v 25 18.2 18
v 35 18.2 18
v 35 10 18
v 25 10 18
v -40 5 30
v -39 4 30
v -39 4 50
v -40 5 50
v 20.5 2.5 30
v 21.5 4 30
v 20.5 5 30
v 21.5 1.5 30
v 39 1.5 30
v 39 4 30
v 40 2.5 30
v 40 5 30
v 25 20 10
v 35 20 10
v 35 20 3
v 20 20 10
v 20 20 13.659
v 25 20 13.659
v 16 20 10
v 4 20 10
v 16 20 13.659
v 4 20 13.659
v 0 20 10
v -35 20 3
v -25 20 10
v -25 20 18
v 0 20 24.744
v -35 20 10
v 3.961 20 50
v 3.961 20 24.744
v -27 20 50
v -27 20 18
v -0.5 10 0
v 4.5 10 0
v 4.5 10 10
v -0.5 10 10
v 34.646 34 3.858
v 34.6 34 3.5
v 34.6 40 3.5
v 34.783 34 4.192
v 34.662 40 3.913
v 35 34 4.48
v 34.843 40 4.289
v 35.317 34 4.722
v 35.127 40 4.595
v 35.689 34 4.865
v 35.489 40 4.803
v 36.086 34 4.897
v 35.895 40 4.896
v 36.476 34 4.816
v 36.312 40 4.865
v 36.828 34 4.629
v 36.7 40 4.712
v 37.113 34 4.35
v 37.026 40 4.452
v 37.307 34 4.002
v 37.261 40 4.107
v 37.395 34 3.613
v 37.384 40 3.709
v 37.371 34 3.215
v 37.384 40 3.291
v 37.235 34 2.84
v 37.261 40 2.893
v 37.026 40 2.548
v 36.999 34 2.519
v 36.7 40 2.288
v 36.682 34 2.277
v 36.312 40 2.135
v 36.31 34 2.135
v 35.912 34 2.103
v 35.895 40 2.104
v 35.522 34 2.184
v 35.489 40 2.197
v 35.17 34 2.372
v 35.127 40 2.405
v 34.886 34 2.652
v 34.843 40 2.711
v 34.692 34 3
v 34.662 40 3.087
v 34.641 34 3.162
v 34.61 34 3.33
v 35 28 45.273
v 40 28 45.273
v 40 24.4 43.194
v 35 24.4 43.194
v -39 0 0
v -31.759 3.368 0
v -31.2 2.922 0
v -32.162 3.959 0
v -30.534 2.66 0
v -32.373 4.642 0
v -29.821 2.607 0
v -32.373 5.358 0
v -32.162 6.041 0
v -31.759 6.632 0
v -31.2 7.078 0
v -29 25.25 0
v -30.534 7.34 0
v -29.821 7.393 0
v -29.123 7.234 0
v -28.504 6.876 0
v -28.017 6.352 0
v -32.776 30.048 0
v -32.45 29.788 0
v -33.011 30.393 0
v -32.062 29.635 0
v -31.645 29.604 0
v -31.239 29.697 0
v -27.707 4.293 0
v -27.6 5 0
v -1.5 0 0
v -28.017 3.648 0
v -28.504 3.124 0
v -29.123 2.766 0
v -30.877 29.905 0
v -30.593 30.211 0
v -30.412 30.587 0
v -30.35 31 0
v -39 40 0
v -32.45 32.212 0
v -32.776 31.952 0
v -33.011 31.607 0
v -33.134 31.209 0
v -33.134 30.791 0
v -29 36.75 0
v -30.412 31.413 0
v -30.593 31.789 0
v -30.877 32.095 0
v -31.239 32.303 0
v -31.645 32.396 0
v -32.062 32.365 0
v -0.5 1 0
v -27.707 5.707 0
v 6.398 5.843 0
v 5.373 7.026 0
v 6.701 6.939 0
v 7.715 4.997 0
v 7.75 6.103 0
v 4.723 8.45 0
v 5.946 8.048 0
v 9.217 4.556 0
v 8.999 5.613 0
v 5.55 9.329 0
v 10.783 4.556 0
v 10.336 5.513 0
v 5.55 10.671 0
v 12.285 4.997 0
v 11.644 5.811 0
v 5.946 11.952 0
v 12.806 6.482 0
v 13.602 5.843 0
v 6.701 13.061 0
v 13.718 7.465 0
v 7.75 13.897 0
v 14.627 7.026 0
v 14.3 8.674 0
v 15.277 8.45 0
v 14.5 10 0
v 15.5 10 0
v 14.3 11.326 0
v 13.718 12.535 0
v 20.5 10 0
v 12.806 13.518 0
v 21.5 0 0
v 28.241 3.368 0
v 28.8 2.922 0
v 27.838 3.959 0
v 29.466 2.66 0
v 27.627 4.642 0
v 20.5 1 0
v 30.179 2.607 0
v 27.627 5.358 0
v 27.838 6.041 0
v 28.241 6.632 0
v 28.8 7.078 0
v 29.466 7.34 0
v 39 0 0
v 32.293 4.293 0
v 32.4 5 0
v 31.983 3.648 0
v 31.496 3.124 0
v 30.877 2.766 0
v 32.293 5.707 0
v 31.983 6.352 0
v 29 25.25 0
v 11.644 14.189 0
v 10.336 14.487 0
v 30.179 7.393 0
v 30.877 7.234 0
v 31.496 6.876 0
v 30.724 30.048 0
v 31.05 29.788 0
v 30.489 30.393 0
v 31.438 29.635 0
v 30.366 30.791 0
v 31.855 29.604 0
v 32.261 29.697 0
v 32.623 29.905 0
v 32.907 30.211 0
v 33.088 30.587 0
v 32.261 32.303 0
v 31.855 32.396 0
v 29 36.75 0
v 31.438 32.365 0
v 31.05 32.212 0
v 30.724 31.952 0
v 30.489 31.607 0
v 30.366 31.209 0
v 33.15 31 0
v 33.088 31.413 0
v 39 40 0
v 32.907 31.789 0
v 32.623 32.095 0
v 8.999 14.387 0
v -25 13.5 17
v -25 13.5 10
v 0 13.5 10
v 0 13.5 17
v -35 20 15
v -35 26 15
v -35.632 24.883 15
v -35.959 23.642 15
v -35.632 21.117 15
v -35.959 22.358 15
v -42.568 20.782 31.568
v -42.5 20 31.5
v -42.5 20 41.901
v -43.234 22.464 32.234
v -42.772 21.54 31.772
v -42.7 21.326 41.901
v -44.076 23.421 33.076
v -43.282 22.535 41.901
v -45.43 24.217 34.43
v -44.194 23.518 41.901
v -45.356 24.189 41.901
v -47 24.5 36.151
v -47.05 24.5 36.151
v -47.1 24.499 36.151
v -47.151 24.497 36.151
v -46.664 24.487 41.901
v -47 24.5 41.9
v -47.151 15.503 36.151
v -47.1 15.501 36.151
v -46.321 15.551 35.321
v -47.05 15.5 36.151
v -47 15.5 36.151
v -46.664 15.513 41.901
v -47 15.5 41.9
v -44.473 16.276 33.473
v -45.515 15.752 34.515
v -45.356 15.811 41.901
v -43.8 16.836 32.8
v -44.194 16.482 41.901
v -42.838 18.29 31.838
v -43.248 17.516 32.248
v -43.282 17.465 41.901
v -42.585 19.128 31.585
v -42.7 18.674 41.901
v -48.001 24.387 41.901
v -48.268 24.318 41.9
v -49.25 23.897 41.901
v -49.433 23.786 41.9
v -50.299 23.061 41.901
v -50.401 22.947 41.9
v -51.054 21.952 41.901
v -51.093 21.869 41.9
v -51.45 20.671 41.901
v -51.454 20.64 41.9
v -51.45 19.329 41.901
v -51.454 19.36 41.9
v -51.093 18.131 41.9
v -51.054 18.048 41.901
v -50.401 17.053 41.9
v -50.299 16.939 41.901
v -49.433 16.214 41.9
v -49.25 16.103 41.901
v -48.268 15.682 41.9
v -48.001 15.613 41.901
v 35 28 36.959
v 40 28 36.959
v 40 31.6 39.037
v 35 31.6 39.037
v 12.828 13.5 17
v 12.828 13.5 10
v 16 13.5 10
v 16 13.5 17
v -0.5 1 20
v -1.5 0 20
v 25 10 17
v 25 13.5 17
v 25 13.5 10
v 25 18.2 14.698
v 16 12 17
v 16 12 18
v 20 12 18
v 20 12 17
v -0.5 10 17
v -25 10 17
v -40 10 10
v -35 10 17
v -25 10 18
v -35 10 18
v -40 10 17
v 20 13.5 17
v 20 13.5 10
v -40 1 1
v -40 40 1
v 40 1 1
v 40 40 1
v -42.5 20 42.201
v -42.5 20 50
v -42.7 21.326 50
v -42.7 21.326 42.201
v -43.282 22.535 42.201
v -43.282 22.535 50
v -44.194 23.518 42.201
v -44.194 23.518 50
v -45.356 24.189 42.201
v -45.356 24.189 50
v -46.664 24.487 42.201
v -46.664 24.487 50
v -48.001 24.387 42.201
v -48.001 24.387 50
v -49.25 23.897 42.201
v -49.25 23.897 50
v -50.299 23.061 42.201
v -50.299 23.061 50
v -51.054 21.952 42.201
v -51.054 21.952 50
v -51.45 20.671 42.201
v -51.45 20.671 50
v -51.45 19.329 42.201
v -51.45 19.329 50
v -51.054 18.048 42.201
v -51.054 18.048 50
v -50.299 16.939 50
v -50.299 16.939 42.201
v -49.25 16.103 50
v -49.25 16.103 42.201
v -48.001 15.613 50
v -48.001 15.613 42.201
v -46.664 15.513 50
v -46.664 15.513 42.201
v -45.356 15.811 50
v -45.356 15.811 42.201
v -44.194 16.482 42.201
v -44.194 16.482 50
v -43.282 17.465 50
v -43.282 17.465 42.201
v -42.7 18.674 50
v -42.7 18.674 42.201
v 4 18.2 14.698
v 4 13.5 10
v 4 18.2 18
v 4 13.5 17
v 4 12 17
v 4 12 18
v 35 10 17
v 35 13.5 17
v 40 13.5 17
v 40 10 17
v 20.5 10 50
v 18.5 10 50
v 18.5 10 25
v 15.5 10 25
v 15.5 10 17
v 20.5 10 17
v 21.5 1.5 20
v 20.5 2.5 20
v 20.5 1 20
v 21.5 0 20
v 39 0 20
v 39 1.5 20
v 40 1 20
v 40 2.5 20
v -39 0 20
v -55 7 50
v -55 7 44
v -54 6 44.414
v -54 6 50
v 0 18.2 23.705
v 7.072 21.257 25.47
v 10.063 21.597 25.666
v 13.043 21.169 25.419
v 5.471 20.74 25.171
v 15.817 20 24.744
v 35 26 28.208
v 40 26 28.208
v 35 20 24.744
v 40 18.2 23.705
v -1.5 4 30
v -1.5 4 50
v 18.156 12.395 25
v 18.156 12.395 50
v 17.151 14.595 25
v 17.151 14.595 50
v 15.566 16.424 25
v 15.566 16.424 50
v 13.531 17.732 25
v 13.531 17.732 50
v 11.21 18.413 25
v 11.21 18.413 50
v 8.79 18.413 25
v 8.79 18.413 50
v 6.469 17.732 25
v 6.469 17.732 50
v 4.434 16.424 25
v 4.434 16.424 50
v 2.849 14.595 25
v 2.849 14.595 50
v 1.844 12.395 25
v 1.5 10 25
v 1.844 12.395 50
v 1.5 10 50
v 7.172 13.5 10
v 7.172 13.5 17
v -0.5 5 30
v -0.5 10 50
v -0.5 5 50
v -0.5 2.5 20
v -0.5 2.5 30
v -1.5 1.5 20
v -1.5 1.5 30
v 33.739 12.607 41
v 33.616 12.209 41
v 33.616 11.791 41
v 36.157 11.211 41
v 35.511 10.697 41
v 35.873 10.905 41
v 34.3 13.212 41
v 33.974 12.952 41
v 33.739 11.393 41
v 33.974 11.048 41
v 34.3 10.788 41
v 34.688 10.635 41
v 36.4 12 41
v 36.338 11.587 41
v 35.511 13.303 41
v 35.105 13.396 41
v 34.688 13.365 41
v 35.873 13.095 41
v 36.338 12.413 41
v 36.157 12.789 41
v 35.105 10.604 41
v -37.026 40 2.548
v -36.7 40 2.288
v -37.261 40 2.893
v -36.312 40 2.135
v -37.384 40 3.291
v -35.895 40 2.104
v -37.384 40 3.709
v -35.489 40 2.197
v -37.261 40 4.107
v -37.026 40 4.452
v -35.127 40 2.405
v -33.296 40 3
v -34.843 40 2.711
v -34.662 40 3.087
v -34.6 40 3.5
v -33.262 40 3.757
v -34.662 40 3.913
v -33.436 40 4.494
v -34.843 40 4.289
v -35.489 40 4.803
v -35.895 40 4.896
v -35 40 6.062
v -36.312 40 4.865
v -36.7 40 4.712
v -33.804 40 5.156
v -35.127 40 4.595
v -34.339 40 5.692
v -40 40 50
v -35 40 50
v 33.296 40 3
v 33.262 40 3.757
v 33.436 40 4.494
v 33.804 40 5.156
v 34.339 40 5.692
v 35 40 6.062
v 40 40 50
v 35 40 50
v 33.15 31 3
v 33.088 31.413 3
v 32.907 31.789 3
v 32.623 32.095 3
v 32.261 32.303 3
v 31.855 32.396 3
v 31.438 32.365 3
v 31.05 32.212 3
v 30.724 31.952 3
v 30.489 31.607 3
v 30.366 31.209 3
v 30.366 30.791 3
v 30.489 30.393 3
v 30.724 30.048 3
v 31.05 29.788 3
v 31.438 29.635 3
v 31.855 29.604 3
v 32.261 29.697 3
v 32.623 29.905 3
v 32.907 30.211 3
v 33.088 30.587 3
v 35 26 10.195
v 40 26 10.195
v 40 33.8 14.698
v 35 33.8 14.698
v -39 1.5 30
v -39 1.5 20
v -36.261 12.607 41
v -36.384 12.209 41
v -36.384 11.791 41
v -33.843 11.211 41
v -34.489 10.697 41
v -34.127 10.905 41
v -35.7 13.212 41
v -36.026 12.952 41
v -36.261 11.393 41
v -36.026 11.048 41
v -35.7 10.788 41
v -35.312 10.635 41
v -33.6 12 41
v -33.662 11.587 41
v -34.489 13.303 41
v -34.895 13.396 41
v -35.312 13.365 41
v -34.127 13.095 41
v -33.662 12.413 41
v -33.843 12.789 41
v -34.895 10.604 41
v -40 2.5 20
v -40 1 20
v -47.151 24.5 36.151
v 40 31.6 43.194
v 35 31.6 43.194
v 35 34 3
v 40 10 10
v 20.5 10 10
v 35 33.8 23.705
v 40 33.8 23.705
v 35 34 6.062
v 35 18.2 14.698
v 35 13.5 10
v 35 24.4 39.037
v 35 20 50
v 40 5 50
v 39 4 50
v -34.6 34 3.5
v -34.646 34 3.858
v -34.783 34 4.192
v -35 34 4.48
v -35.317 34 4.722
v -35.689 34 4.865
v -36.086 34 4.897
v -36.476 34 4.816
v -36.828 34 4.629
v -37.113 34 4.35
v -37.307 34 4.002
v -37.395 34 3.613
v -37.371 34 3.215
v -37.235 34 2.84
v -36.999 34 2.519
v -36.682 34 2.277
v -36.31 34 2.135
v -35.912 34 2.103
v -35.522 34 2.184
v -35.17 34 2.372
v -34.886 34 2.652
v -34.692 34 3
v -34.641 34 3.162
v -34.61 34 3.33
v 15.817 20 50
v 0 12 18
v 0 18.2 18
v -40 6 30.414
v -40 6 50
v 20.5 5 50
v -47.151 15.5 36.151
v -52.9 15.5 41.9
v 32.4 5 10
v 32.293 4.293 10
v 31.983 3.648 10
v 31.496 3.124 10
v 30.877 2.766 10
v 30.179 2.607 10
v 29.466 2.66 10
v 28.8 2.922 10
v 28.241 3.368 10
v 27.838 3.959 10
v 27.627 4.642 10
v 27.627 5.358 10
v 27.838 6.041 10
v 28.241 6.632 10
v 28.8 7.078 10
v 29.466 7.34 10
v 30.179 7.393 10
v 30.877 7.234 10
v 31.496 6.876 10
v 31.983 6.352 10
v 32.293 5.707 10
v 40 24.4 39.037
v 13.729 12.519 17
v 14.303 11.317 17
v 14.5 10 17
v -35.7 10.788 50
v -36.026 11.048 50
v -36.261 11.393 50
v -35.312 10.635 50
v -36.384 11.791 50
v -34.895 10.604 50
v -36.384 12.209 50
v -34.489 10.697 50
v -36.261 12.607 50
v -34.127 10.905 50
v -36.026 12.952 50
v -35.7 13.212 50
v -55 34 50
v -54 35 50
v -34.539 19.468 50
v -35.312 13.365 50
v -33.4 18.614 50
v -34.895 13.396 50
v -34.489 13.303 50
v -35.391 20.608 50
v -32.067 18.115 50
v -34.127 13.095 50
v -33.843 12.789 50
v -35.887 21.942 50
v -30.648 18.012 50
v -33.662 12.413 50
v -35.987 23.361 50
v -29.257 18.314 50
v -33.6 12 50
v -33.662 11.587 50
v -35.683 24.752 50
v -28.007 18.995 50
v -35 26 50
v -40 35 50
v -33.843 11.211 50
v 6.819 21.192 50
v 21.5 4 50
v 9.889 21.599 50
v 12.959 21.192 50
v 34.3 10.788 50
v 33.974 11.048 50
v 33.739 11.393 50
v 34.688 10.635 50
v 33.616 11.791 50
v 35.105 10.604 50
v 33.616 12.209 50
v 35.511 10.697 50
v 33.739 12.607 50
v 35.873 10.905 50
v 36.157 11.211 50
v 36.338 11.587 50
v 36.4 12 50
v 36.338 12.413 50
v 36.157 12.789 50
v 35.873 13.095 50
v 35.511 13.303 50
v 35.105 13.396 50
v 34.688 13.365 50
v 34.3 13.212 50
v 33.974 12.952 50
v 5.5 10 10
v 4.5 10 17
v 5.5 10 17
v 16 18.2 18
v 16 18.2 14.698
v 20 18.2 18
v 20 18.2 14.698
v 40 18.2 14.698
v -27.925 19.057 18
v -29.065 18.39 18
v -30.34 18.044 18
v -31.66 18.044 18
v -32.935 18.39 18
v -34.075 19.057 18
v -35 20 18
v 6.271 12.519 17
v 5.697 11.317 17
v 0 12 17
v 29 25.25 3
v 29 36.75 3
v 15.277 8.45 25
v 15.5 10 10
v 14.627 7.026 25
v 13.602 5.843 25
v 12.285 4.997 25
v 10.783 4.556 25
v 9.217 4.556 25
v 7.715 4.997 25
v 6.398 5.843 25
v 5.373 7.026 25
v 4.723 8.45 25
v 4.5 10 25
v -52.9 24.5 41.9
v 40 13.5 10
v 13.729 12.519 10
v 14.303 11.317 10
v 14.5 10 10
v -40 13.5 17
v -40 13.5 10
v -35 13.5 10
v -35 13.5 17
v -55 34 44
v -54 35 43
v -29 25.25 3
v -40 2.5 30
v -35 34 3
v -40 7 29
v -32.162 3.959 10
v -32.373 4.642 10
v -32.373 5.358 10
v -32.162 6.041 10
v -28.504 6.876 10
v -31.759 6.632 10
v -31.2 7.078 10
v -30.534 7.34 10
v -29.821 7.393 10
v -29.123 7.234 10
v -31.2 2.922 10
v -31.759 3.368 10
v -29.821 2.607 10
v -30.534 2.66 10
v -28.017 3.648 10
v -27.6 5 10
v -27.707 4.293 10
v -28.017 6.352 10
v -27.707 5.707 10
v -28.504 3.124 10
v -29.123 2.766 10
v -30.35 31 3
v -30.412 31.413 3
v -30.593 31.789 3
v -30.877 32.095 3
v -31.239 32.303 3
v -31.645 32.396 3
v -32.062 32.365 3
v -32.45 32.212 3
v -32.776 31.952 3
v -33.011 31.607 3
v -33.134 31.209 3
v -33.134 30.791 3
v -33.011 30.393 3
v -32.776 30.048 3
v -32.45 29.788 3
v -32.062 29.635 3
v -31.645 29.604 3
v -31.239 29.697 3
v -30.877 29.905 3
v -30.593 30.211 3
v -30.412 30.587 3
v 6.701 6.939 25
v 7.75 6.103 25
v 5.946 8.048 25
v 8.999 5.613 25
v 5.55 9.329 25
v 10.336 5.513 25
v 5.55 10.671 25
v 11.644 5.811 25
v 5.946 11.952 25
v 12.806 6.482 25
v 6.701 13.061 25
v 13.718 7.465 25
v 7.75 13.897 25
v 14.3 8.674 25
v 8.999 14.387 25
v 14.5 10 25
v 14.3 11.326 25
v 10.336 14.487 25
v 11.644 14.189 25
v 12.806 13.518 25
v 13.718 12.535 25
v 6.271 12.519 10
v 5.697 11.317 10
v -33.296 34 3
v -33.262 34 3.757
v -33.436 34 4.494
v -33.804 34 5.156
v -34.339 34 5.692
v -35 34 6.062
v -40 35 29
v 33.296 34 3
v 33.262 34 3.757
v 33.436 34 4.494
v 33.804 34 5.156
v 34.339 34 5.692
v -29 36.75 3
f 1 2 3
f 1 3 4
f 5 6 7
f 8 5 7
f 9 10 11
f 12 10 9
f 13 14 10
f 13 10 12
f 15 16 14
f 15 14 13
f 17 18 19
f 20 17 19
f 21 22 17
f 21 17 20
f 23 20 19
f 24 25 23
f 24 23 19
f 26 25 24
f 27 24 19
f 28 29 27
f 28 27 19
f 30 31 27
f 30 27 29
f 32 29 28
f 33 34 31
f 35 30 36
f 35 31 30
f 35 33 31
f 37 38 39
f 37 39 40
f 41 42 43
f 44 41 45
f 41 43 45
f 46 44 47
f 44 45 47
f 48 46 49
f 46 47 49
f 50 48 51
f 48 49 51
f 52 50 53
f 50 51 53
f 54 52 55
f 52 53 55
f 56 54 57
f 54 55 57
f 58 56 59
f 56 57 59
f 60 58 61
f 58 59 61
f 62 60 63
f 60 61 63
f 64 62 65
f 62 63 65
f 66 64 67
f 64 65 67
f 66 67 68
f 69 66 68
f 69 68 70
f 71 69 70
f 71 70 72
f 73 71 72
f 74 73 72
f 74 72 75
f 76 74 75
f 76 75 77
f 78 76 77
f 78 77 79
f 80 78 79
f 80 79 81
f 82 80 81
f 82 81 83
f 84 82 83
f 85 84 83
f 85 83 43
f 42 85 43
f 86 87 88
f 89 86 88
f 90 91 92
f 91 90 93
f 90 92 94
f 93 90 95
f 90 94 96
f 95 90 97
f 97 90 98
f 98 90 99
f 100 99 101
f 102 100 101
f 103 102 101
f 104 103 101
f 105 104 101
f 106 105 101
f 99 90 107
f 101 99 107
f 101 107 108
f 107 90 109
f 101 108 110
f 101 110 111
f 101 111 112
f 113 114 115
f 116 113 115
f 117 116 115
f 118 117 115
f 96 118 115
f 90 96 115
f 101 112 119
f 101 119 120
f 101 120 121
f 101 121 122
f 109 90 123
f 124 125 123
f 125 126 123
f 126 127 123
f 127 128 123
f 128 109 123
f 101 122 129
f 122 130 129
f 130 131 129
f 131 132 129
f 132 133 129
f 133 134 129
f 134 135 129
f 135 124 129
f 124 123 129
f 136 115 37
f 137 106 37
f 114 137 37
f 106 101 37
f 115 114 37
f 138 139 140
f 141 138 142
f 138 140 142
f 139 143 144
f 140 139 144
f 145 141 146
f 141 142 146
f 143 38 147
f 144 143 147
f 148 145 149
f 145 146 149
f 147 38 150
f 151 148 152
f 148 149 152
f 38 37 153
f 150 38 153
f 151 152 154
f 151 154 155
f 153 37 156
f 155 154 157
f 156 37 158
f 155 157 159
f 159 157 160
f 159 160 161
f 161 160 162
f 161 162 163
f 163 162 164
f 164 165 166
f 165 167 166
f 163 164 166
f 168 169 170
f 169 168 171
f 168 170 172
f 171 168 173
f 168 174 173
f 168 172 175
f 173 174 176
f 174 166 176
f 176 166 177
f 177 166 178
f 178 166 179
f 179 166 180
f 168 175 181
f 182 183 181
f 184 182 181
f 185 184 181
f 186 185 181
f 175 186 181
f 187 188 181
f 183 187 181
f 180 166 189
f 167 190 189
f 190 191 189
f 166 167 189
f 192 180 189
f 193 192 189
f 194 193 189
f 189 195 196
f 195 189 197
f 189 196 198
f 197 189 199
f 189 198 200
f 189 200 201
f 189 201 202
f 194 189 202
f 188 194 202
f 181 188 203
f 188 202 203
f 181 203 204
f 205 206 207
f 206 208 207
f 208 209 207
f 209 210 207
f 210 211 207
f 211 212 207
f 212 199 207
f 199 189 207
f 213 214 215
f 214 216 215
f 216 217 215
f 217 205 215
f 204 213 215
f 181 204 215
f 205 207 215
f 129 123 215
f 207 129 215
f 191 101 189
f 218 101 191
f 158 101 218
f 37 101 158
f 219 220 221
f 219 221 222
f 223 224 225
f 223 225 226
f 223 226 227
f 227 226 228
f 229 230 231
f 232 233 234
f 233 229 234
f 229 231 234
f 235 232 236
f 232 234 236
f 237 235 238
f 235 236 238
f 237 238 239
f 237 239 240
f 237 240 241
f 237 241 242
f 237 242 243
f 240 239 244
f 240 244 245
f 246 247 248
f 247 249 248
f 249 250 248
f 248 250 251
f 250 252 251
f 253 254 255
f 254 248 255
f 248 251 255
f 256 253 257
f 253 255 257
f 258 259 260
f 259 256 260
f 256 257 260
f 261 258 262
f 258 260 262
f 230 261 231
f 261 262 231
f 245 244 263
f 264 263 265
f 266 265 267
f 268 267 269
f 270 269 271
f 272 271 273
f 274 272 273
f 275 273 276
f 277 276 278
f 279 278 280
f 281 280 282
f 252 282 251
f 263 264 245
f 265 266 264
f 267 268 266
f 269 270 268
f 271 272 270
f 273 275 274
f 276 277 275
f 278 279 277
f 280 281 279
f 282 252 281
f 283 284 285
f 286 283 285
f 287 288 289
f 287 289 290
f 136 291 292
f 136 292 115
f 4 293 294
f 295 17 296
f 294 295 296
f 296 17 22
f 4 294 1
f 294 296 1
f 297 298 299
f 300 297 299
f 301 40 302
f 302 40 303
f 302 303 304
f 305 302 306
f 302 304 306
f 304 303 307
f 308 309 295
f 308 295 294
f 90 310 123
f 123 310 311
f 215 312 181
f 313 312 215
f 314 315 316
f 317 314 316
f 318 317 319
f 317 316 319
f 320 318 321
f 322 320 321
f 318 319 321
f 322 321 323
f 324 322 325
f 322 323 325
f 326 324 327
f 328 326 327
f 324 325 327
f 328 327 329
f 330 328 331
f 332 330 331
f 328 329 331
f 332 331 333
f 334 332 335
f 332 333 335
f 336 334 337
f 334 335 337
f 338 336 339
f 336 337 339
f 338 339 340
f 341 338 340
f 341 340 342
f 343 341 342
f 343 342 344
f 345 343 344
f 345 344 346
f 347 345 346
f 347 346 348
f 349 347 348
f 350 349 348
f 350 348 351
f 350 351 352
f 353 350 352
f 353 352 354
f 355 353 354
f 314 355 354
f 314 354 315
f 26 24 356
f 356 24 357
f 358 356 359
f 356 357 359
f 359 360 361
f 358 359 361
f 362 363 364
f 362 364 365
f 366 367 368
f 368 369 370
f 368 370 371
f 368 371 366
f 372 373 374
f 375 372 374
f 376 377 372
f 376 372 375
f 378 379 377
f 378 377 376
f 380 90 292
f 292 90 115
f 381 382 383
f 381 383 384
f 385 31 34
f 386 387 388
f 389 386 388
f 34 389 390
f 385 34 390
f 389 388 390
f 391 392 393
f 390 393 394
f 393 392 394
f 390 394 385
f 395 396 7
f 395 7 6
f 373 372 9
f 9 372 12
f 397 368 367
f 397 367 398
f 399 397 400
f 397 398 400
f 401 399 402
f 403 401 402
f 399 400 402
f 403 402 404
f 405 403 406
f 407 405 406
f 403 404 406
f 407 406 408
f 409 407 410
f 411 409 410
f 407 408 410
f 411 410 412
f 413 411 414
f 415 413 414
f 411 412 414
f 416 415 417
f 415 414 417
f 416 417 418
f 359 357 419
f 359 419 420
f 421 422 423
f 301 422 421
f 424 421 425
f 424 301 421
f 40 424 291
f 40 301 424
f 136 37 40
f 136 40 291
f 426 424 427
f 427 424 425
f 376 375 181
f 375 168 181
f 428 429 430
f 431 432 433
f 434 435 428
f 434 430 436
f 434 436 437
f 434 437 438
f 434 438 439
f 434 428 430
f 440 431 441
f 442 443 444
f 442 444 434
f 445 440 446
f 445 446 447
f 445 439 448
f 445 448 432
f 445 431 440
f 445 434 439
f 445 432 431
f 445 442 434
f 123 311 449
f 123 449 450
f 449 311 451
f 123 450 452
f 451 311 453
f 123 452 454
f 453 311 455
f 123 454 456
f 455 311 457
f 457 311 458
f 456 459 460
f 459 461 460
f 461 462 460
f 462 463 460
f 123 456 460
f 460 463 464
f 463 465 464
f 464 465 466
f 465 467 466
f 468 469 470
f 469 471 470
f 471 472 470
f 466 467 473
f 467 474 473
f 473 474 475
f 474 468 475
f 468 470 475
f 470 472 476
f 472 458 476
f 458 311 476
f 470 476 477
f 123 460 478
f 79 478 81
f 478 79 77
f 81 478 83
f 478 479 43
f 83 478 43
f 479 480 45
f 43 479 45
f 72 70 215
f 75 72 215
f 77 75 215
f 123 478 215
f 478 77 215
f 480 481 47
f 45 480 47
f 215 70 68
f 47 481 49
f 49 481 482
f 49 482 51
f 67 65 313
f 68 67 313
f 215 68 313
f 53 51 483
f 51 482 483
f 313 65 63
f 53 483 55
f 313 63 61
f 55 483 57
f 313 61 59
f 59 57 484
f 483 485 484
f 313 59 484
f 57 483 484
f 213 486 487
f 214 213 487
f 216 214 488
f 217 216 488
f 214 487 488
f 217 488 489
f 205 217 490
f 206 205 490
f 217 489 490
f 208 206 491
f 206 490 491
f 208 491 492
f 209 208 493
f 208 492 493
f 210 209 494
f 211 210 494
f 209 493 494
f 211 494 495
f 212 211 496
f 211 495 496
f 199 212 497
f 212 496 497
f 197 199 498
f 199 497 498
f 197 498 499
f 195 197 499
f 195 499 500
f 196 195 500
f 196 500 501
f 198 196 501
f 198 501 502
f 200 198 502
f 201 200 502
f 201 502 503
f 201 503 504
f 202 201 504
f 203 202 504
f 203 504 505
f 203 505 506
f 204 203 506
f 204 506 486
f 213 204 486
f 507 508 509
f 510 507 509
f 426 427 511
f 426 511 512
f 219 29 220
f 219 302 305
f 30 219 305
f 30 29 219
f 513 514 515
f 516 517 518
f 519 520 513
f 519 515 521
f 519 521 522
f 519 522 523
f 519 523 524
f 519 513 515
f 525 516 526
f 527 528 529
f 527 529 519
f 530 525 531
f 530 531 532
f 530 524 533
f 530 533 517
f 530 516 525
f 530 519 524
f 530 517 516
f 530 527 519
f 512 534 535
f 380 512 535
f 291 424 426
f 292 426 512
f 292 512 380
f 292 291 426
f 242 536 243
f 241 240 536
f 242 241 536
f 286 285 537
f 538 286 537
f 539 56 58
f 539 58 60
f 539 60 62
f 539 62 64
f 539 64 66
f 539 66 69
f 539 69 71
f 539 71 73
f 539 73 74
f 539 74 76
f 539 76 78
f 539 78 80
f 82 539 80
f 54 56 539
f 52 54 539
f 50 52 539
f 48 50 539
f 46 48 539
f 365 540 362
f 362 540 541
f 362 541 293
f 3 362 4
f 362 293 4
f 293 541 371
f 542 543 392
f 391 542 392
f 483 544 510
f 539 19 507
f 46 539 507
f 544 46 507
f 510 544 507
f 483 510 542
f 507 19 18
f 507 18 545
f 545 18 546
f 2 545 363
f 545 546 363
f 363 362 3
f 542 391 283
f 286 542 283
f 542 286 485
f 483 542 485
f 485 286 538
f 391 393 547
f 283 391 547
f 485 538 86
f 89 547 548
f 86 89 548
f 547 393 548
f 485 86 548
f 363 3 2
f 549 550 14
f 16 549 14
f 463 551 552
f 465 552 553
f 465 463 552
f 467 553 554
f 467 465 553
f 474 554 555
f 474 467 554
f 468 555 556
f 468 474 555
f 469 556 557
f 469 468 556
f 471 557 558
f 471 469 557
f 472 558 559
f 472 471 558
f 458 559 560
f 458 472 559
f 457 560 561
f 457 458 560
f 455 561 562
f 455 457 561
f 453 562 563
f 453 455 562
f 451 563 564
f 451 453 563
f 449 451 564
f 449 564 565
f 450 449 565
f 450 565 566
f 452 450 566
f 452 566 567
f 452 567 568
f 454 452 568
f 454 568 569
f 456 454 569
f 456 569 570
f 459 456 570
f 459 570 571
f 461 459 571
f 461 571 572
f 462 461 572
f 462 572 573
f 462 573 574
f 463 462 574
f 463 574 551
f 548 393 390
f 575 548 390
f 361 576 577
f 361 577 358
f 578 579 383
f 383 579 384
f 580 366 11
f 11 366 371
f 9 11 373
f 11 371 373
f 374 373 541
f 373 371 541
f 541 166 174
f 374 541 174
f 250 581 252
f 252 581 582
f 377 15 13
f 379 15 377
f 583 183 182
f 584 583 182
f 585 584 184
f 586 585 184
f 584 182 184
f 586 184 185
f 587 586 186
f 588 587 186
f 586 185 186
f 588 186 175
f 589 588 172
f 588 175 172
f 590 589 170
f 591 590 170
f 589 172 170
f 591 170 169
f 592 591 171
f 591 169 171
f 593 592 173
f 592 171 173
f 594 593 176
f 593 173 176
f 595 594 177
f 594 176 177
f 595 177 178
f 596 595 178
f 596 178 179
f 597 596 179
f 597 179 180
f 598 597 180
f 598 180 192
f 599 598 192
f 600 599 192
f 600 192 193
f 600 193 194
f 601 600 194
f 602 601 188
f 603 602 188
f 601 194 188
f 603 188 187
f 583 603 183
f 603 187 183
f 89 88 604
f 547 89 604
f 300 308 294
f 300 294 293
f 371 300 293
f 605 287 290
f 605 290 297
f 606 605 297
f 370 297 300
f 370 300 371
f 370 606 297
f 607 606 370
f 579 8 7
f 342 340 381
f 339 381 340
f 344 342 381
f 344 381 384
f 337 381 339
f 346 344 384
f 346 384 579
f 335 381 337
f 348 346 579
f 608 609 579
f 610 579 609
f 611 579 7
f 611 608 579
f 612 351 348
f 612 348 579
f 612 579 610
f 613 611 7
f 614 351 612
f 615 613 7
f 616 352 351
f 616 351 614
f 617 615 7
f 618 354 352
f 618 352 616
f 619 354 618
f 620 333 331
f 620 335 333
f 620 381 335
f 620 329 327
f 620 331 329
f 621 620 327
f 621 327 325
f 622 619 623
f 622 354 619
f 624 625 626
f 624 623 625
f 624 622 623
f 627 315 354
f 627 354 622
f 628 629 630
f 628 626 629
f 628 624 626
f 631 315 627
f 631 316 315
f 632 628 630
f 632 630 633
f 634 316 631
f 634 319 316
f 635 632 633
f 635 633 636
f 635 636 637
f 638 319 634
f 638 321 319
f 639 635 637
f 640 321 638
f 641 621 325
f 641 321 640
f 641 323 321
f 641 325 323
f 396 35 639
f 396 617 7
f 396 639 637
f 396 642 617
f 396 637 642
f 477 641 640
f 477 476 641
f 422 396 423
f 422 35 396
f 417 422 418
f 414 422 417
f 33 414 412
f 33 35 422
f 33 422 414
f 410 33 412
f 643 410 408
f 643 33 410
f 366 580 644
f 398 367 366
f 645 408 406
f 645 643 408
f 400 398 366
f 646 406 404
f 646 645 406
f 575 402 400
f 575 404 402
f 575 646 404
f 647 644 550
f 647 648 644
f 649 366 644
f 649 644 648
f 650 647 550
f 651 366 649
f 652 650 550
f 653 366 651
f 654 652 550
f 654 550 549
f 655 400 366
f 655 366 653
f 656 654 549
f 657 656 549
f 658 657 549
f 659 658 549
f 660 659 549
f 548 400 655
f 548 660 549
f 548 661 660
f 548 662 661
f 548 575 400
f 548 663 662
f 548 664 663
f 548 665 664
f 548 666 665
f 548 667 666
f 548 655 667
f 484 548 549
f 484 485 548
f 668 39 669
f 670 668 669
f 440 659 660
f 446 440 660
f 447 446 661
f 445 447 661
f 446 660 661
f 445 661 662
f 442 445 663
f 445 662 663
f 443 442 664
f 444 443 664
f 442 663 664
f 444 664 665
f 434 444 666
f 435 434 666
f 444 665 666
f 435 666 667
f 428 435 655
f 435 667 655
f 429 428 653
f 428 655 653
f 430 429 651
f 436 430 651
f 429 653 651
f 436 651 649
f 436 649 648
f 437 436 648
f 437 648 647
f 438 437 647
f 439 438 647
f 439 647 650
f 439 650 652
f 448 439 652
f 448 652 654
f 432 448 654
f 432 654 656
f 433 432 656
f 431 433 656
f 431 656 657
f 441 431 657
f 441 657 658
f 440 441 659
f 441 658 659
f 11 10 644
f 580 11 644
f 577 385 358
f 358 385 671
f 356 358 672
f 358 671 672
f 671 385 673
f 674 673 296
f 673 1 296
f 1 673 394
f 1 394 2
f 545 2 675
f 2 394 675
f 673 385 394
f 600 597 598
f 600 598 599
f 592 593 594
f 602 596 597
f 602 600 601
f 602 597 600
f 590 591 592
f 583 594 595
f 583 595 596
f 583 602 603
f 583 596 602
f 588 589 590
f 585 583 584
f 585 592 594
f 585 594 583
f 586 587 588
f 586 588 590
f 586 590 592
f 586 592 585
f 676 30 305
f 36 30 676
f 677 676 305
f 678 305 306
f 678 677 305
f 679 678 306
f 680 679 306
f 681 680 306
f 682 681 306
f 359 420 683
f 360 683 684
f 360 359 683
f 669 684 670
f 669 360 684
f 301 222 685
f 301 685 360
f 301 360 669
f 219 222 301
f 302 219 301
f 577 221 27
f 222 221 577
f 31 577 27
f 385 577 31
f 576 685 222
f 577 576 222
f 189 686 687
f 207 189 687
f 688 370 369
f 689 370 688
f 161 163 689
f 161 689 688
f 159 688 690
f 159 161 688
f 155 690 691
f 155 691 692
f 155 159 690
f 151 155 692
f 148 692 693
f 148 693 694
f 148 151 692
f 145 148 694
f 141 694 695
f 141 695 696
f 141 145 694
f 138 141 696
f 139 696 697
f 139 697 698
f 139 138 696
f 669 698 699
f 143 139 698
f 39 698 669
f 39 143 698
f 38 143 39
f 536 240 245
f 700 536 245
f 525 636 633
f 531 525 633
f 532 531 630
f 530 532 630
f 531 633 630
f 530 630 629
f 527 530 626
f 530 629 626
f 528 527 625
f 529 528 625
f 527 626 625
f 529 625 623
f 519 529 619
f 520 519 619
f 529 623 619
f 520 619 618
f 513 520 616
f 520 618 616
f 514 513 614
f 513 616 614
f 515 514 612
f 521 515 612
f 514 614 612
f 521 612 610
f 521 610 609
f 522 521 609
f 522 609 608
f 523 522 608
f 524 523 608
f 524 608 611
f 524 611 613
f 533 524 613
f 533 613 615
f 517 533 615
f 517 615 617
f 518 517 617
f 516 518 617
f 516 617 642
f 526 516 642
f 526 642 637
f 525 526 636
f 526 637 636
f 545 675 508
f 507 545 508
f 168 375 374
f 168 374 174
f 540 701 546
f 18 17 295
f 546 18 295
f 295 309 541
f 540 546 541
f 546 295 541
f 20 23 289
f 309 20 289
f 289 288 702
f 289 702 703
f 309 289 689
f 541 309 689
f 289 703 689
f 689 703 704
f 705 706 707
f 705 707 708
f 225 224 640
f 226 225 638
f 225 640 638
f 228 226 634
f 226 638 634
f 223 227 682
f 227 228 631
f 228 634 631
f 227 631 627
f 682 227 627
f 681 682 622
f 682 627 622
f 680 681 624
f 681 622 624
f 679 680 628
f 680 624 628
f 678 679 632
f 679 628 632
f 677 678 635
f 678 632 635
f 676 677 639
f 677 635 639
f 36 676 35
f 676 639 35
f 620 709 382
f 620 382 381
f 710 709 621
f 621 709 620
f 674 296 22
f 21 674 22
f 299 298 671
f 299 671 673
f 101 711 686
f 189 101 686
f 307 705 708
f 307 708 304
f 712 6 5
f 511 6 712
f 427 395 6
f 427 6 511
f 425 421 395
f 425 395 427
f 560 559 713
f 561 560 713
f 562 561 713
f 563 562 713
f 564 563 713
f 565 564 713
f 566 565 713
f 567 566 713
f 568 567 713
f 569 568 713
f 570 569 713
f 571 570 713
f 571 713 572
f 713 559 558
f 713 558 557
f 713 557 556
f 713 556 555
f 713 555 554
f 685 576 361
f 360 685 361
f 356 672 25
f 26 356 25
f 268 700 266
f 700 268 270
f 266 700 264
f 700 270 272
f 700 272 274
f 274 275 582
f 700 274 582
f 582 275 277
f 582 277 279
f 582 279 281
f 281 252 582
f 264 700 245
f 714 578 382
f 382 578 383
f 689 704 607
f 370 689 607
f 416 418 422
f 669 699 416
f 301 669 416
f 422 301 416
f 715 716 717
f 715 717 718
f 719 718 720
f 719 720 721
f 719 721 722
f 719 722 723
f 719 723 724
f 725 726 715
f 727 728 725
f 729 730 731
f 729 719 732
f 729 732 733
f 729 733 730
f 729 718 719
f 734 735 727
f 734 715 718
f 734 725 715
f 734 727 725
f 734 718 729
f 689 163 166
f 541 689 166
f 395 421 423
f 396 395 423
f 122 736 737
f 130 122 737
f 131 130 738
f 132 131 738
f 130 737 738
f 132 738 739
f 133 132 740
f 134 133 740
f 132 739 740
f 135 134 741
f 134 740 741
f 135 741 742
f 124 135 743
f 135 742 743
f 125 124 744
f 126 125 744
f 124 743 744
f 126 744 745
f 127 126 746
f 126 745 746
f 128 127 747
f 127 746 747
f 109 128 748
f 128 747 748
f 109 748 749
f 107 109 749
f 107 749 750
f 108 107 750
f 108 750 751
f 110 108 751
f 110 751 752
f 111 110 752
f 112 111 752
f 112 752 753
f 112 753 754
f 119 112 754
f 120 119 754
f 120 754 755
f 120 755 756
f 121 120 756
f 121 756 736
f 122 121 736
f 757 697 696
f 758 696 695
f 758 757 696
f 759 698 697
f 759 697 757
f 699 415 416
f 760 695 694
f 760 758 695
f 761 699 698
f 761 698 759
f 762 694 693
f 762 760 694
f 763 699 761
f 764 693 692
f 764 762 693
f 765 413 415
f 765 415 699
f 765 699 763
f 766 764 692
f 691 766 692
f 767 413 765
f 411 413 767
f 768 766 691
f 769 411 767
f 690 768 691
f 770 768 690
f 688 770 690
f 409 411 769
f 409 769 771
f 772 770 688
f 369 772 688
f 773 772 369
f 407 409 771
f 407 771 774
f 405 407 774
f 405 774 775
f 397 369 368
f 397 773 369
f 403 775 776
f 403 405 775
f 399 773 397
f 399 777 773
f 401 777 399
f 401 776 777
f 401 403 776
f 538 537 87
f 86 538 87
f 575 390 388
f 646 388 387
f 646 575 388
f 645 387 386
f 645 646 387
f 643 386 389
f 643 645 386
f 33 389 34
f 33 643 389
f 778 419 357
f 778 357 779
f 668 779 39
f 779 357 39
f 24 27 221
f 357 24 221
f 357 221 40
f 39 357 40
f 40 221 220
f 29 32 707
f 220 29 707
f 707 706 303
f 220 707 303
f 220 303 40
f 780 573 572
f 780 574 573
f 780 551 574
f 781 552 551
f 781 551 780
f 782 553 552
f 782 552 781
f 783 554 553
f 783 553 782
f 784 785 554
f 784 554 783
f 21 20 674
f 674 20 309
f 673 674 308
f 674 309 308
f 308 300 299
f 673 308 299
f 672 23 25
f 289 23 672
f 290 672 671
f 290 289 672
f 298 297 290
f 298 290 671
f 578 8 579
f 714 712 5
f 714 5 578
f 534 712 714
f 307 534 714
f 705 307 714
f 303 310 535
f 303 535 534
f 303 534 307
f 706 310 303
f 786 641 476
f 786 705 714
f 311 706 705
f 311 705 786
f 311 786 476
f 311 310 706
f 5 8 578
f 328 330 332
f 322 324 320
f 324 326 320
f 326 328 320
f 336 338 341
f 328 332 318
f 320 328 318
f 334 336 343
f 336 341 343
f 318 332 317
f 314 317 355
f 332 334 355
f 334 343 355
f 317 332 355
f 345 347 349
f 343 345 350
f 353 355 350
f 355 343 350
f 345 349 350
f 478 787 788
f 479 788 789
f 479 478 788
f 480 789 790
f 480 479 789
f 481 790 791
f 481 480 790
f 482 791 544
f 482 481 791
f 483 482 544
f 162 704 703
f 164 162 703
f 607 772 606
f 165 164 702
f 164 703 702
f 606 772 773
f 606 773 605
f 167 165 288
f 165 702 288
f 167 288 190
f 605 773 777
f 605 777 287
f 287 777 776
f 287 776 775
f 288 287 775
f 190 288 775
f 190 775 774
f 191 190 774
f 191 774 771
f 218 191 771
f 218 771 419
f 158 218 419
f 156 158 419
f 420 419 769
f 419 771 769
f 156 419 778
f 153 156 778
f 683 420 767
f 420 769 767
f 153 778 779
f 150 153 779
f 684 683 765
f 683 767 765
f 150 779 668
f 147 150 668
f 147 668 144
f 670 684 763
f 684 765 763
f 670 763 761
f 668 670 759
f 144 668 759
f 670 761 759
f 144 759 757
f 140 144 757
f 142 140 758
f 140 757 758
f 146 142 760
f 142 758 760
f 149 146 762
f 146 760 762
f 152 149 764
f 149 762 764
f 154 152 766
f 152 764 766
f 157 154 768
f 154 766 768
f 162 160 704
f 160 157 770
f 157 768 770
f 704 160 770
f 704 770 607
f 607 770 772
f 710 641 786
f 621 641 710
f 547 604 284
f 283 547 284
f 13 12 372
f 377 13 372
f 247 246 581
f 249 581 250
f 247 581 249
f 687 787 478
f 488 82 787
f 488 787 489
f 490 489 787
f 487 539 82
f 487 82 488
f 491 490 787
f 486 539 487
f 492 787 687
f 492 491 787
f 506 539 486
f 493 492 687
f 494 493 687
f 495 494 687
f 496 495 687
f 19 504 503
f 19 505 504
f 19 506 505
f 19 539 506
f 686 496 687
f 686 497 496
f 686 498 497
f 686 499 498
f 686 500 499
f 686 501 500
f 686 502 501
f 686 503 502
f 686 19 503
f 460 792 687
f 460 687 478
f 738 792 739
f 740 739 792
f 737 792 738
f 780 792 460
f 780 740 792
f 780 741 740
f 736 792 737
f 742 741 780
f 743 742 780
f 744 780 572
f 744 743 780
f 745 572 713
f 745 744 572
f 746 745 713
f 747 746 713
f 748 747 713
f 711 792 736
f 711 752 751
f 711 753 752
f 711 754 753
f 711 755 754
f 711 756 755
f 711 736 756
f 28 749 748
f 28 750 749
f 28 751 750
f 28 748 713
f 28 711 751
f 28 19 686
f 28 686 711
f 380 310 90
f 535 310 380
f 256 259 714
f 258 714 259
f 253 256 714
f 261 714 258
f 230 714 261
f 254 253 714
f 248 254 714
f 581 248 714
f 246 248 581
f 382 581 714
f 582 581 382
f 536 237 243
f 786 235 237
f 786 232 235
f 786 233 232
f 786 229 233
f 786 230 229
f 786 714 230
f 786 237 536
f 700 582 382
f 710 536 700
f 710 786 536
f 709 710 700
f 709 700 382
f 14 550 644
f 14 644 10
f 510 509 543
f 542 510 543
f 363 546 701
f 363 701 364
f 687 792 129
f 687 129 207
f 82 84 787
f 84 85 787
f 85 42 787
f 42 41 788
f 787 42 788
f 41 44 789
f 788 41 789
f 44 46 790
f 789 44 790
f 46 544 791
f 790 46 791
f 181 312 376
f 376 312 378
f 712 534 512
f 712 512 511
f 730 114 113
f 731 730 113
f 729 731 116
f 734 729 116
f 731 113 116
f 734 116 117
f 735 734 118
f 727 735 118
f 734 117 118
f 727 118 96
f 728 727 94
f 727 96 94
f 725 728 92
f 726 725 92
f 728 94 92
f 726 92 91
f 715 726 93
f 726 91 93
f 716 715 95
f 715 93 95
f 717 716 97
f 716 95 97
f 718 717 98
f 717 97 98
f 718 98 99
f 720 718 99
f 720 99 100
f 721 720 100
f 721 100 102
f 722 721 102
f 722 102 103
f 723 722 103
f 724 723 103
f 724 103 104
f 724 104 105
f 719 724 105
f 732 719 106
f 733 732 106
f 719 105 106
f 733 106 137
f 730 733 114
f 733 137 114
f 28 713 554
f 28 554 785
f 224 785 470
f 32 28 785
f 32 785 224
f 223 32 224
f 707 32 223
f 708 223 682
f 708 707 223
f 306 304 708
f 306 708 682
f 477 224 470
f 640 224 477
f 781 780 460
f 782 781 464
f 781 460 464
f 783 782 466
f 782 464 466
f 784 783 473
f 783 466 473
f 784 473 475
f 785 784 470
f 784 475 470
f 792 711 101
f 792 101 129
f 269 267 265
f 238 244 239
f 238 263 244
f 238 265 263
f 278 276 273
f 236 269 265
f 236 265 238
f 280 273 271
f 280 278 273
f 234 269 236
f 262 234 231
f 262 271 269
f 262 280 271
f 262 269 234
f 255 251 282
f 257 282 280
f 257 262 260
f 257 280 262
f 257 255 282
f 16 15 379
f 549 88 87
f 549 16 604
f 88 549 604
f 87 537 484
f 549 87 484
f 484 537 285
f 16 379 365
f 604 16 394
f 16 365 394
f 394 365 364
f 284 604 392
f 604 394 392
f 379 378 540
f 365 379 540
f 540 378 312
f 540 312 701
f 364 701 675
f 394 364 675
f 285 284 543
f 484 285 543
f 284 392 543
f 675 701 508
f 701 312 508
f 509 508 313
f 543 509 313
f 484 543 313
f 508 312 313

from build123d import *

# Parameters (mm, degrees)
SKETCH_W             = 80
SKETCH_H             = 40
PAD_DEPTH            = 50
SKETCH002_R          = 4.5
POCKET_DEPTH         = 50.001
SKETCH015_R          = 8.5
POCKET001_DEPTH      = 25
SKETCH004_W          = 70
SKETCH004_H          = 57
POCKET002_DEPTH      = 15
POCKET002_DEPTH_BACK = 100
SKETCH005_R          = 1.4
SKETCH005_W          = 58
SKETCH005_H          = 11.5
POCKET003_DEPTH      = 5
SKETCH006_W          = 3.5
SKETCH006_H          = 7
POCKET004_DEPTH      = 80.001
SKETCH007_W          = 10
SKETCH007_H          = 8
POCKET005_DEPTH      = 10
PAD002_DEPTH         = 29
SKETCH009_R          = 4.5
POCKET006_DEPTH      = 50.001
SKETCH013_W          = 9
SKETCH013_H          = 5.749281
POCKET007_DEPTH      = 5
POCKET007_DEPTH_BACK = 100
SKETCH014_W          = 11.905407
SKETCH014_H          = 10.178417
PAD003_DEPTH         = 0.3
POCKET029_DEPTH      = 95.001
SKETCH018_R          = 1.4
POCKET030_DEPTH      = 9
SKETCH019_R          = 2.4
POCKET031_DEPTH      = 10
POCKET032_DEPTH      = 50.001
SKETCH021_W          = 4
SKETCH021_H          = 8
POCKET033_DEPTH      = 28.001
SKETCH025_R          = 2.75
PAD014_DEPTH         = 6
SKETCH049_R          = 1.4
POCKET039_DEPTH      = 6
SKETCH044_R          = 5
POCKET040_DEPTH      = 35
PAD015_DEPTH         = 31
POCKET041_DEPTH      = 40
CHAMFER015_SIZE      = 1
CHAMFER016_SIZE      = 1
CHAMFER017_SIZE      = 1
CHAMFER018_SIZE      = 1


with BuildPart() as part:
    # Sketch → Pad (new body)
    with BuildSketch(Plane.XY):
        with Locations((0, 20)):
            Rectangle(SKETCH_W, SKETCH_H)
    extrude(amount=PAD_DEPTH)

    # Sketch002 → Pocket (cut, through all)
    with BuildSketch(Plane.XY.offset(50)):
        with Locations((10, 10)):
            Circle(SKETCH002_R)
    extrude(amount=-POCKET_DEPTH, mode=Mode.SUBTRACT)

    # Sketch015 (on Face5 of Pocket) → Pocket001 (cut)
    with BuildSketch(Plane.XY.offset(50)):
        with Locations((10, 10)):
            Circle(SKETCH015_R)
    extrude(amount=-POCKET001_DEPTH, mode=Mode.SUBTRACT)

    # Sketch004 → Pocket002 (cut, two sides)
    with BuildSketch(Plane(origin=(0, 35, 0), x_dir=(-1, 0, 0), z_dir=(0, 1, 0))) as pocket002_sk:
        with Locations((0, 31.5)):
            Rectangle(SKETCH004_W, SKETCH004_H)
    extrude(amount=-POCKET002_DEPTH, mode=Mode.SUBTRACT)
    extrude(pocket002_sk.sketch, amount=POCKET002_DEPTH_BACK, mode=Mode.SUBTRACT)

    # Sketch005 → Pocket003 (cut)
    with BuildSketch(Plane.XY.offset(3)):
        with Locations((-31.75, 31)):
            Circle(SKETCH005_R)
        with Locations((31.75, 31)):
            Circle(SKETCH005_R)
        with Locations((0, 31)):
            Rectangle(SKETCH005_W, SKETCH005_H)
    extrude(amount=-POCKET003_DEPTH, mode=Mode.SUBTRACT)

    # Sketch006 → Pocket004 (cut, through all)
    with BuildSketch(Plane(origin=(-40, 0, 0), x_dir=(0, -1, 0), z_dir=(-1, 0, 0))):
        with Locations((-11.75, 13.5)):
            Rectangle(SKETCH006_W, SKETCH006_H)
    extrude(amount=-POCKET004_DEPTH, mode=Mode.SUBTRACT)

    # Sketch007 → Pocket005 (cut)
    with BuildSketch(Plane(origin=(0, 20, 0), x_dir=(-1, 0, 0), z_dir=(0, 1, 0))):
        with Locations((-30, 14)):
            Rectangle(SKETCH007_W, SKETCH007_H)
        with Locations((30, 14)):
            Rectangle(SKETCH007_W, SKETCH007_H)
    extrude(amount=-POCKET005_DEPTH, mode=Mode.SUBTRACT)

    # Sketch008 → Pad002 (join)
    with BuildSketch(Plane(origin=(0, 35, 0), x_dir=(-1, 0, 0), z_dir=(0, 1, 0))):
        Polygon((40, 29), (55, 44), (55, 50), (40, 50), align=None)
    extrude(amount=-PAD002_DEPTH)

    # Sketch009 → Pocket006 (cut, through all)
    with BuildSketch(Plane.XY.offset(50)):
        with Locations((-47, 20)):
            Circle(SKETCH009_R)
    extrude(amount=-POCKET006_DEPTH, mode=Mode.SUBTRACT)

    # Sketch013 → Pocket007 (cut, two sides)
    with BuildSketch(Plane(origin=(-52, 0, 0), x_dir=(0, -1, 0), z_dir=(-1, 0, 0))) as pocket007_sk:
        with Locations((-20, 39.025359)):
            Rectangle(SKETCH013_W, SKETCH013_H)
    extrude(amount=-POCKET007_DEPTH, mode=Mode.SUBTRACT)
    extrude(pocket007_sk.sketch, amount=POCKET007_DEPTH_BACK, mode=Mode.SUBTRACT)

    # Sketch014 → Pad003 (join)
    with BuildSketch(Plane(origin=(0, 0, 41.900547), x_dir=(1, 0, 0), z_dir=(0, 0, -1))):
        with Locations((-46.607828, -20.201936)):
            Rectangle(SKETCH014_W, SKETCH014_H)
    extrude(amount=-PAD003_DEPTH)

    # Sketch017 → Pocket029 (cut, through all)
    with BuildSketch(Plane.YZ.offset(40)):
        Polygon((4, 53.2), (4, 30), (1.5, 30), (1.5, 20), (-2.11, 20), (-2.11, 61.28), align=None)
    extrude(amount=-POCKET029_DEPTH, mode=Mode.SUBTRACT)

    # Sketch018 → Pocket030 (cut)
    with BuildSketch(Plane.XY.offset(50)):
        with Locations((-35, 12)):
            Circle(SKETCH018_R)
        with Locations((35, 12)):
            Circle(SKETCH018_R)
    extrude(amount=-POCKET030_DEPTH, mode=Mode.SUBTRACT)

    # Sketch019 → Pocket031 (cut)
    with BuildSketch(Plane(origin=(0, 0, 0), x_dir=(1, 0, 0), z_dir=(0, 0, -1))):
        with Locations((-30, -5)):
            Circle(SKETCH019_R)
        with Locations((30, -5)):
            Circle(SKETCH019_R)
    extrude(amount=-POCKET031_DEPTH, mode=Mode.SUBTRACT)

    # Sketch020 → Pocket032 (cut, through all)
    with BuildSketch(Plane(origin=(0, 0, 0), x_dir=(1, 0, 0), z_dir=(0, 0, -1))):
        with BuildLine():
            ThreePointArc((15.5, -10), (10, -4.5), (4.5, -10))
            Line((4.5, -10), (-0.5, -10))
            Line((-0.5, -10), (-0.5, 2.44))
            Line((-0.5, 2.44), (20.5, 2.44))
            Line((20.5, -10), (20.5, 2.44))
            Line((15.5, -10), (20.5, -10))
        make_face()
    extrude(amount=-POCKET032_DEPTH, mode=Mode.SUBTRACT)

    # Sketch021 → Pocket033 (cut, through all)
    with BuildSketch(Plane.XZ.offset(-12)):
        with Locations((18, 14)):
            Rectangle(SKETCH021_W, SKETCH021_H)
        with Locations((2, 14)):
            Rectangle(SKETCH021_W, SKETCH021_H)
    extrude(amount=-POCKET033_DEPTH, mode=Mode.SUBTRACT)

    # Sketch025 (on Face1 of Pocket033) → Pad014 (join)
    with BuildSketch(Plane(origin=(0, 40, 0), x_dir=(-1, 0, 0), z_dir=(0, 1, 0))):
        with Locations((-36, 3.5)):
            Circle(SKETCH025_R)
    pad014 = extrude(amount=-PAD014_DEPTH)

    # Mirrored002: Pad014 across Sketch025 V_Axis
    add(pad014.mirror(Plane(origin=(0, 40, 0), x_dir=(0, 1, 0), z_dir=(-1, 0, 0))))

    # Sketch049 (on Face1 of Mirrored002) → Pocket039 (cut)
    with BuildSketch(Plane(origin=(0, 40, 0), x_dir=(-1, 0, 0), z_dir=(0, 1, 0))):
        with Locations((-36, 3.5)):
            Circle(SKETCH049_R)
    pocket039 = extrude(amount=-POCKET039_DEPTH, mode=Mode.SUBTRACT)

    # Mirrored003: Pocket039 across Sketch049 V_Axis
    add(pocket039.mirror(Plane(origin=(0, 40, 0), x_dir=(0, 1, 0), z_dir=(-1, 0, 0))), mode=Mode.SUBTRACT)

    # Sketch044 → Pocket040 (cut)
    with BuildSketch(Plane.XY.offset(50)):
        with Locations((-31, 23)):
            Circle(SKETCH044_R)
    extrude(amount=-POCKET040_DEPTH, mode=Mode.SUBTRACT)

    # Sketch026 → Pad015 (join)
    with BuildSketch(Plane.XY.offset(50)):
        with BuildLine():
            ThreePointArc((21.221659, 13.061419), (12.186737, 21.372713), (0.660759, 17.14669))
            Line((1.758582, 14.664218), (0.660759, 17.14669))
            ThreePointArc((19.018099, 12.326896), (11.159892, 19.192932), (1.758582, 14.664218))
            Line((19.018099, 12.326896), (21.221659, 13.061419))
        make_face()
    extrude(amount=-PAD015_DEPTH)

    # Sketch042 → Pocket041 (cut)
    with BuildSketch(Plane.YZ.offset(40)):
        Polygon((26, 10.194524), (33.8, 14.697856), (33.8, 23.70452), (26, 28.207852), (18.2, 23.70452), (18.2, 14.697856), align=None)
        Polygon((31.6, 39.037417), (31.6, 43.194339), (28, 45.2728), (24.4, 43.194339), (24.4, 39.037417), (28, 36.958956), align=None)
    extrude(amount=-POCKET041_DEPTH, mode=Mode.SUBTRACT)

    # Chamfer015
    chamfer015_edges = [part.edges().sort_by_distance(p)[0] for p in [
        (40, 20, 0),
        (-40, 20, 0),
    ]]
    chamfer(chamfer015_edges, length=CHAMFER015_SIZE)

    # Chamfer016
    chamfer016_edges = [part.edges().sort_by_distance(p)[0] for p in [
        (-55, 35, 47),
        (-55, 6, 47),
        (-47.5, 6, 36.5),
    ]]
    chamfer(chamfer016_edges, length=CHAMFER016_SIZE)

    # Chamfer017
    chamfer017_edges = [part.edges().sort_by_distance(p)[0] for p in [
        (-0.5, 4, 40),
        (20.5, 4, 40),
        (20.5, 1.5, 25),
        (-0.5, 1.5, 25),
        (-0.5, 0, 10),
        (20.5, 0, 10),
    ]]
    chamfer(chamfer017_edges, length=CHAMFER017_SIZE)

    # Chamfer018
    chamfer018_edges = [part.edges().sort_by_distance(p)[0] for p in [
        (40, 0, 10.5),
        (40, 1.5, 25),
        (40, 4, 40),
        (-40, 0, 10.5),
        (-40, 1.5, 25),
        (-40, 4, 40),
    ]]
    chamfer(chamfer018_edges, length=CHAMFER018_SIZE)


solid = part.part
